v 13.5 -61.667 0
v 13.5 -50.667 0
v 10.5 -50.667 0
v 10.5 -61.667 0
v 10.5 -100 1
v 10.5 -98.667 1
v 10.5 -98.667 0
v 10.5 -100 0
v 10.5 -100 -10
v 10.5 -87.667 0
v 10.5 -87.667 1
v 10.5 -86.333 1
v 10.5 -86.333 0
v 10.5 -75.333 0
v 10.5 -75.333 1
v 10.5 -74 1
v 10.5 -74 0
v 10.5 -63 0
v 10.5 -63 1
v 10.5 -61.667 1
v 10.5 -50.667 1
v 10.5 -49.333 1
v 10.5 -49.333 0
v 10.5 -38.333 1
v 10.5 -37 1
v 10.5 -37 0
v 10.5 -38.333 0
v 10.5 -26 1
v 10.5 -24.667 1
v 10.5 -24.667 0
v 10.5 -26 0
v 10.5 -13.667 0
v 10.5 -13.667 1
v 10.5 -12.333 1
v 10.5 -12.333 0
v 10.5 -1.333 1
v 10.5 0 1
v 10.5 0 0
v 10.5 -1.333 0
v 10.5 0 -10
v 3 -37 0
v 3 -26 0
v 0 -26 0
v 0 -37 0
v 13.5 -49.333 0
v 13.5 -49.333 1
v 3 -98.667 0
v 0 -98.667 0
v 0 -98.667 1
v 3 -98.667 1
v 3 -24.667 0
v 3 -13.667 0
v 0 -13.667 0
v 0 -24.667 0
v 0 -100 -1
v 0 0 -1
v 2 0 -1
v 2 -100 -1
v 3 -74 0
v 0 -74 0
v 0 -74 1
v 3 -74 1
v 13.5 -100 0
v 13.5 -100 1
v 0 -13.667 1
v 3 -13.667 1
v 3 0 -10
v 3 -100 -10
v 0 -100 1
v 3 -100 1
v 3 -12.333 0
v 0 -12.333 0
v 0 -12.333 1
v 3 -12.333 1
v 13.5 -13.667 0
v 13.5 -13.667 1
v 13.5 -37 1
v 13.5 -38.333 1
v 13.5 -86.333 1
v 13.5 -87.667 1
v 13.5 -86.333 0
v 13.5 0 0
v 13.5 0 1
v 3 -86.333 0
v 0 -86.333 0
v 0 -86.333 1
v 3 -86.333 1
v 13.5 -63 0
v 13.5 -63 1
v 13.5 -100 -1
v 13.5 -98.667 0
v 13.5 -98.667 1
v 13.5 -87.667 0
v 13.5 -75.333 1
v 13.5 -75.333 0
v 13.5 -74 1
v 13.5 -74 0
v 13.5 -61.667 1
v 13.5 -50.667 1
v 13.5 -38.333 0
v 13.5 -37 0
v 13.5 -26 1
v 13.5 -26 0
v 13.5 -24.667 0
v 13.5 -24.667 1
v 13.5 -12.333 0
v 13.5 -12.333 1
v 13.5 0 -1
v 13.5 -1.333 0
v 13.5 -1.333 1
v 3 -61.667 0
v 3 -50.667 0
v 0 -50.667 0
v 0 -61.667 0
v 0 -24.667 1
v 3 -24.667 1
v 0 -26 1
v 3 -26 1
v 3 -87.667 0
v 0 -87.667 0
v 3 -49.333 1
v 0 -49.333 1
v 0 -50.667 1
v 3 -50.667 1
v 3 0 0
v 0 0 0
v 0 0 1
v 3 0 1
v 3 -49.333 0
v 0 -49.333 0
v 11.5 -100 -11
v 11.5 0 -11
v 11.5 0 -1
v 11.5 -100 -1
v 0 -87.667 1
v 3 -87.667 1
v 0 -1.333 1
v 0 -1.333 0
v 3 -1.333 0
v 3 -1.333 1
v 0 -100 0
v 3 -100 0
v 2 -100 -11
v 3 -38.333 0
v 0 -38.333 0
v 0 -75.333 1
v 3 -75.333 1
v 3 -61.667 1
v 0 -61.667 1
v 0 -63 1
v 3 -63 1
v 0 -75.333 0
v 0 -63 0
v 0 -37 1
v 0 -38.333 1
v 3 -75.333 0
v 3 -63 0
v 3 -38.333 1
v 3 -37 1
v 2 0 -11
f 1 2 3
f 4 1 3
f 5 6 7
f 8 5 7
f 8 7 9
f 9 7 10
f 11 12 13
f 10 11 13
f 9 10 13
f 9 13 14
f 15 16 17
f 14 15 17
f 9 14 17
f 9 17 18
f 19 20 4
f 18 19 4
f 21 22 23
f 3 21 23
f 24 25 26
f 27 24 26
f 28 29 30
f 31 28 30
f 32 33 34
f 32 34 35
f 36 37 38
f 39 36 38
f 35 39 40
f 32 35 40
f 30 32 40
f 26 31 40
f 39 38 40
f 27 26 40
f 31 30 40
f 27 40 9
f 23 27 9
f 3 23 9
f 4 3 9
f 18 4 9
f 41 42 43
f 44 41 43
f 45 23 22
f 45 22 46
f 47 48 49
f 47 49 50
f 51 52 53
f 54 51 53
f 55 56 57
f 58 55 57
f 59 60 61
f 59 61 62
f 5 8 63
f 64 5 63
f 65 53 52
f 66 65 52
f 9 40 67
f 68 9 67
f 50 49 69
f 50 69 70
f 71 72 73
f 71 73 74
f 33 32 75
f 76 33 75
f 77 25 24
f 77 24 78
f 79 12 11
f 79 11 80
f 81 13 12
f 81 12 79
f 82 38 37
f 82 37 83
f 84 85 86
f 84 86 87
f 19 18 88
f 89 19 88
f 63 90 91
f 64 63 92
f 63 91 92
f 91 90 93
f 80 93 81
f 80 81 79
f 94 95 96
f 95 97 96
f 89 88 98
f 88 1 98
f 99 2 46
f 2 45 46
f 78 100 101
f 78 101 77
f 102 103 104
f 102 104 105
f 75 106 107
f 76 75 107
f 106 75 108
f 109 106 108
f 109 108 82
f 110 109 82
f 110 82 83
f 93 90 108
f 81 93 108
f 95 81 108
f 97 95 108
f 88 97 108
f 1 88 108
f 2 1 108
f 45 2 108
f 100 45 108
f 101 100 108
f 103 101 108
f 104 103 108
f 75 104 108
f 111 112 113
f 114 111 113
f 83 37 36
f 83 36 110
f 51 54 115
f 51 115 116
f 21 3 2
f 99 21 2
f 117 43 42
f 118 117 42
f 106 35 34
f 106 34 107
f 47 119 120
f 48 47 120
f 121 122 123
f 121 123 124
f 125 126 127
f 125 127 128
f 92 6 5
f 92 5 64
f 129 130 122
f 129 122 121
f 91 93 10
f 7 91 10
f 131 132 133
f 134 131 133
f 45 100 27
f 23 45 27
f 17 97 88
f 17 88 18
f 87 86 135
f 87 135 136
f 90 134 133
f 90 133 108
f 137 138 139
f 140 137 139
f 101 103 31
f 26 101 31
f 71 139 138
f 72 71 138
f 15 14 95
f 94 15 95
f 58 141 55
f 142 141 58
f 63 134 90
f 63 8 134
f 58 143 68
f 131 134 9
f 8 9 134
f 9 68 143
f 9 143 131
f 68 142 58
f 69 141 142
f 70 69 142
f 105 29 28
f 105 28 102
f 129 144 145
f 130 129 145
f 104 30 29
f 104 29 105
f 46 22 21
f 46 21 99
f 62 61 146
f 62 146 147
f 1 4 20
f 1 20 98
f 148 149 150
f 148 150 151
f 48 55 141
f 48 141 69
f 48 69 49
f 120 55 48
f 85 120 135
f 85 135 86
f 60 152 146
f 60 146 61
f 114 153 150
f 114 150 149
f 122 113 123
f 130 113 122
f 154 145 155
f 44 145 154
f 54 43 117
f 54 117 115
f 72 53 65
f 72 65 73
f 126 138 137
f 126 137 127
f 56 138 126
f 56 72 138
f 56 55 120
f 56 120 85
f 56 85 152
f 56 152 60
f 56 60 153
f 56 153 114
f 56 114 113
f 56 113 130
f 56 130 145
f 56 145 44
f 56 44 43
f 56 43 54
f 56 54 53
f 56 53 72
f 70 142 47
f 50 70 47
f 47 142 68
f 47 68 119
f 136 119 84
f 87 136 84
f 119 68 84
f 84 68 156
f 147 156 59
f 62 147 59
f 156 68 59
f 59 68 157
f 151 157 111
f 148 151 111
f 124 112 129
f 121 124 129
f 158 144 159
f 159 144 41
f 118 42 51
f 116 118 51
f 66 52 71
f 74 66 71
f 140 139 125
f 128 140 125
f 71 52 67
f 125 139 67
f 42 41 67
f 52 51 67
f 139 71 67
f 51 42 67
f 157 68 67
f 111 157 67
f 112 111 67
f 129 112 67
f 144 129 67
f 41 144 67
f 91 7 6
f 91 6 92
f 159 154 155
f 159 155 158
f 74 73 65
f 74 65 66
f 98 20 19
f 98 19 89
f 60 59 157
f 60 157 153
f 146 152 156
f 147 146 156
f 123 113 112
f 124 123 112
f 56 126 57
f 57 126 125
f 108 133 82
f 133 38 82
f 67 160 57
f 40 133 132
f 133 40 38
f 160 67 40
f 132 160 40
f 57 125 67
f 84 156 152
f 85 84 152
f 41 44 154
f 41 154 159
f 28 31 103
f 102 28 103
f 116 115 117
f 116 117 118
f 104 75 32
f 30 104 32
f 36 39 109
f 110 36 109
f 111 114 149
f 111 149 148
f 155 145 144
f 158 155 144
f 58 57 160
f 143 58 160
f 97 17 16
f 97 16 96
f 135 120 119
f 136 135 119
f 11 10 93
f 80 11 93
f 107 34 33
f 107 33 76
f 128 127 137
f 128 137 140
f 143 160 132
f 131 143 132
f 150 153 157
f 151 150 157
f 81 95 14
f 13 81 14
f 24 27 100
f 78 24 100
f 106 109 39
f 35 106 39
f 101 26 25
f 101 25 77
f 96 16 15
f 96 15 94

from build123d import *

# Parameters (mm, degrees)
F1_DEPTH = 100
F2_W     = 3
F2_H     = 1.333333
F2_H_2   = 1.333334
F3_DEPTH = 1


with BuildPart() as f1:
    # F0 (on Front) → F1 (new body)
    with BuildSketch(Plane.XZ):
        Polygon((3, 0), (0, 0), (0, -1), (2, -1), (2, -11), (11.5, -11), (11.5, -1), (13.5, -1), (13.5, 0), (10.5, 0), (10.5, -10), (3, -10), align=None)
    extrude(amount=F1_DEPTH)

    # F2 (on face) → F3 (join)
    with BuildSketch(Plane.XY):
        with Locations((1.5, -0.666666)):
            Rectangle(F2_W, F2_H)
        with Locations((12, -0.666666)):
            Rectangle(F2_W, F2_H)
        with Locations((1.5, -13)):
            Rectangle(F2_W, F2_H_2)
        with Locations((12, -13)):
            Rectangle(F2_W, F2_H_2)
        with Locations((1.5, -25.333334)):
            Rectangle(F2_W, F2_H)
        with Locations((12, -25.333334)):
            Rectangle(F2_W, F2_H)
        with Locations((1.5, -37.666666)):
            Rectangle(F2_W, F2_H)
        with Locations((12, -37.666666)):
            Rectangle(F2_W, F2_H)
        with Locations((1.5, -50)):
            Rectangle(F2_W, F2_H_2)
        with Locations((12, -50)):
            Rectangle(F2_W, F2_H_2)
        with Locations((1.5, -62.333333)):
            Rectangle(F2_W, F2_H)
        with Locations((12, -62.333333)):
            Rectangle(F2_W, F2_H)
        with Locations((1.5, -74.666666)):
            Rectangle(F2_W, F2_H)
        with Locations((12, -74.666666)):
            Rectangle(F2_W, F2_H)
        with Locations((1.5, -87)):
            Rectangle(F2_W, F2_H_2)
        with Locations((12, -87)):
            Rectangle(F2_W, F2_H_2)
        with Locations((1.5, -99.333333)):
            Rectangle(F2_W, F2_H)
        with Locations((12, -99.333333)):
            Rectangle(F2_W, F2_H)
    extrude(amount=F3_DEPTH)


solid = f1.part
